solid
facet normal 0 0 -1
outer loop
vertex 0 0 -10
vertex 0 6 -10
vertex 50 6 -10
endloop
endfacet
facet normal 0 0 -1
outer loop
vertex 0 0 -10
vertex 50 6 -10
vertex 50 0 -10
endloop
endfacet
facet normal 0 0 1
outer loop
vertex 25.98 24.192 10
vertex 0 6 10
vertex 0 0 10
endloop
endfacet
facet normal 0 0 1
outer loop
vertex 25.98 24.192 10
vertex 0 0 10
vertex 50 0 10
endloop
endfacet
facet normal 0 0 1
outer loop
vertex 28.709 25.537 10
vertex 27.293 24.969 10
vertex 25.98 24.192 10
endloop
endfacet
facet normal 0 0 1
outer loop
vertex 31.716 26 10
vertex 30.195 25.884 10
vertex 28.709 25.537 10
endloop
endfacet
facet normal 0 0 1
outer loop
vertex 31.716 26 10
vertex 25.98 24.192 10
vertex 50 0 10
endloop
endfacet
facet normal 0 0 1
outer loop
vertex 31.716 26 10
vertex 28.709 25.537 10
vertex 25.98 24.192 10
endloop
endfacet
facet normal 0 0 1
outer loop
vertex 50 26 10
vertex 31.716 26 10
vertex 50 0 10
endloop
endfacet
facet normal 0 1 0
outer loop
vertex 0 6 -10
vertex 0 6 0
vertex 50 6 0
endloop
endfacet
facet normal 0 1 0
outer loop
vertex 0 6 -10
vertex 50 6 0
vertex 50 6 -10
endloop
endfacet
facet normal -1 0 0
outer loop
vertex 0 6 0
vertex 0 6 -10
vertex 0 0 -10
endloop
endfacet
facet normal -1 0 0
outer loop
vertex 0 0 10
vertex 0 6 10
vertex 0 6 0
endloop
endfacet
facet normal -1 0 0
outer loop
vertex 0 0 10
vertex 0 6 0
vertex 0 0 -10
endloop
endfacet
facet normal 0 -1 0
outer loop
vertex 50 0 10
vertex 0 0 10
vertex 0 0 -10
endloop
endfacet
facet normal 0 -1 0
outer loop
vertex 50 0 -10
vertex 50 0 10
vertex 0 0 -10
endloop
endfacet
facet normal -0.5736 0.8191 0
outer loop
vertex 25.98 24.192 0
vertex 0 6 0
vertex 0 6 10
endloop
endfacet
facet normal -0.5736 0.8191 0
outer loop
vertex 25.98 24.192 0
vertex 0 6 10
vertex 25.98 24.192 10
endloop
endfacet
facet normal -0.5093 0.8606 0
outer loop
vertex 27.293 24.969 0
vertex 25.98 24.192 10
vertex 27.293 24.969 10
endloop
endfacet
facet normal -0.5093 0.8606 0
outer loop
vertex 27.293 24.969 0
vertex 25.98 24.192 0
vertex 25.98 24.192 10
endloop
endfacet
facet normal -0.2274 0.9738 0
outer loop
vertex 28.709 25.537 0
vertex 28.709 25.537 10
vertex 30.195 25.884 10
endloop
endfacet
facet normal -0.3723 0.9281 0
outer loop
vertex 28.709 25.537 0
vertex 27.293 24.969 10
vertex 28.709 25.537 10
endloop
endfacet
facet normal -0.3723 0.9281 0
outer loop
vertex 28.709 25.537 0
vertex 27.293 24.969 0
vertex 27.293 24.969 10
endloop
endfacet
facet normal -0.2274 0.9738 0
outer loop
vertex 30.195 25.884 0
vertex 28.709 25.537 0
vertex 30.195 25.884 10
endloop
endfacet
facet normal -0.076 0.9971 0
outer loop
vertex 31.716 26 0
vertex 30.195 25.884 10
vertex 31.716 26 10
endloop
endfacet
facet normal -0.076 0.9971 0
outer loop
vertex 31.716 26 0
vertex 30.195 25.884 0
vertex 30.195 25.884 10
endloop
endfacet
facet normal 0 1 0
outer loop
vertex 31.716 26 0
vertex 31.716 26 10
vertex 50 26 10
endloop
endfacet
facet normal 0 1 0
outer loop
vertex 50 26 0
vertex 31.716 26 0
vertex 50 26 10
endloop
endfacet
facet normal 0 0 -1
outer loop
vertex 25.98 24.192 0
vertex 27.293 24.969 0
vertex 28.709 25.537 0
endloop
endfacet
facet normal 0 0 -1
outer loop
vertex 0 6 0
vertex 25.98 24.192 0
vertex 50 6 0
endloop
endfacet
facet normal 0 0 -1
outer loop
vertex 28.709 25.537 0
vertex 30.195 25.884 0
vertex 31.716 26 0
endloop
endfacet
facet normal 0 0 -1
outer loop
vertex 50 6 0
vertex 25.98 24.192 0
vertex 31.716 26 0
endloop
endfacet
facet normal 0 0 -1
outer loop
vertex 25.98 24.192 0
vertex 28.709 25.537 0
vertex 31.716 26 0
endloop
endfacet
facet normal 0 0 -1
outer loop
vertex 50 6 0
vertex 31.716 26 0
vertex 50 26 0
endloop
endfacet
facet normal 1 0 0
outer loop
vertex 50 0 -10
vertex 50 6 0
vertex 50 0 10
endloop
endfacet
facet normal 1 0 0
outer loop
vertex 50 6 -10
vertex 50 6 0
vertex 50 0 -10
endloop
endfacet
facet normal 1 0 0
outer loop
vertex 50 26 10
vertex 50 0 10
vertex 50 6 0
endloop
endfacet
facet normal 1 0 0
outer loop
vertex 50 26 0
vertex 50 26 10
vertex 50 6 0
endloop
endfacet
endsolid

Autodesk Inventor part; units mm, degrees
ref_plane "YZ Plane" through (0, 0, 0) normal (1, 0, 0) x (0, 1, 0)
ref_plane "XZ Plane" through (0, 0, 0) normal (0, 1, 0) x (-1, 0, 0)
ref_plane "XY Plane" through (0, 0, 0) normal (0, 0, 1) x (1, 0, 0)
sketch "Sketch1" plane through (0, 0, 0) normal (0, 0, 1) x (1, 0, 0)
  line L0 (0, 0) -> (41.7159, 0)
  line L1 (41.7159, 0) -> (41.7159, 6)
  line L2 (41.7159, 6) -> (0, 6)
  line L3 (0, 6) -> (0, 0)
  line L4 (0, 6) -> (41.7159, 35.2098)
  line L5 (41.7159, 6) -> (41.7159, 35.2098)
  circle A0 centre (31.7159, 16) radius 10
  point P0 (41.7159, 16)
  point P1 (25.9802, 24.1915)
  dimension "d0" = 35
  dimension "d1" = 6
  dimension "d12" = 20
extrude "Extrusion1" add sketch "Sketch1" along normal blind 10 contours L3 L2 L1 L0 | L4 A0 L2 | L2 A0 L5 | A0
sketch "Sketch3" plane through (0, 0, 0) normal (0, 0, -1) x (-1, 0, 0)
  line L0 (-41.7159, 0) -> (-41.7159, 16) projected
  line L1 (0, 0) -> (-41.7159, 0) projected
  line L2 (0, 6) -> (0, 0) projected
  line L3 (-25.9802, 24.1915) -> (0, 6) projected
  line L4 (-47.336, 39.1451) -> (0, 6) projected
  line L5 (-41.7159, 0) -> (0, 0)
  line L6 (0, 0) -> (0, 6)
  line L7 (0, 6) -> (-41.7159, 6)
  line L8 (-41.7159, 6) -> (-41.7159, 0)
  arc A0 (-25.9802, 24.1915) -> (-41.7159, 16) centre (-31.7159, 16) ccw projected
  point P0 (-46.3964, 40.4871)
extrude "Extrusion3" add sketch "Sketch3" along normal blind 10 contours L0 L7 L2 L1
sketch "Sketch4" plane through (0, 0, 10) normal (0, 0, 1) x (1, 0, 0)
  line L0 (0, 6) -> (0, 0) projected
  line L1 (0, 0) -> (41.7159, 0) projected
  line L2 (41.7159, 0) -> (41.7159, 16) projected
  arc A0 (41.7159, 16) -> (25.9802, 24.1915) centre (31.7159, 16) ccw projected
  line L3 (25.9802, 24.1915) -> (0, 6) projected
  line L4 (31.7159, 26) -> (50, 26)
  line L5 (50, 26) -> (50, 0)
  line L6 (50, 0) -> (31.7159, 0)
  line L7 (31.7159, 0) -> (31.7159, 26)
  arc A1 (41.7159, 16) -> (25.9802, 24.1915) centre (31.7159, 16) ccw projected
  point P0 (41.7159, 0)
  dimension "d14" = 50
extrude "Extrusion4" add sketch "Sketch4" against normal up to surface (10 mm away) contours L4 L5 L6 L2 A0
sketch "Sketch5" plane through (41.7159, 0, 0) normal (1, 0, 0) x (0, 0, -1)
  line L0 (0, 6) -> (0, 0) projected
  line L1 (0, 0) -> (10, 0) projected
  line L2 (10, 6) -> (10, 0) projected
  line L3 (0, 6) -> (10, 6) projected
  point P0 (0, 0)
extrude "Extrusion5" add sketch "Sketch5" along normal up to surface (8.2841 mm away)
properties part number "Print_Parts_F1"
